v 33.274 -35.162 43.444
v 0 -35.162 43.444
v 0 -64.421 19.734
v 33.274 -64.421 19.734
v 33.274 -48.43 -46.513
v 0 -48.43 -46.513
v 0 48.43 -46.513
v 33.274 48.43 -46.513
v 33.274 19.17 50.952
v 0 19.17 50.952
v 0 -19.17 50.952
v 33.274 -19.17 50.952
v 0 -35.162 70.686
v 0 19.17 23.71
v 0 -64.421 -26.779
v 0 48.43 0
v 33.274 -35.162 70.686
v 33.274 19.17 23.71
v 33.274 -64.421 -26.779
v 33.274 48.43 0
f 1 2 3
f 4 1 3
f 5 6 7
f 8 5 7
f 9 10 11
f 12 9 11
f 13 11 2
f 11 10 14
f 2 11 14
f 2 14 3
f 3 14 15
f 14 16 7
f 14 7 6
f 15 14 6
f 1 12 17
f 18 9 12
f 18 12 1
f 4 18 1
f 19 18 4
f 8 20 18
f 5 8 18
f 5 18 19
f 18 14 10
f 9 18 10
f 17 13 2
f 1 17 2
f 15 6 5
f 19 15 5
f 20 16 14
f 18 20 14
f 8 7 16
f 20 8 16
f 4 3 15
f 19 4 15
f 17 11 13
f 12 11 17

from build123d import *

# Parameters (mm, degrees)
F1_DEPTH = 33.274
F2_DEPTH = 25.4


with BuildPart() as f1:
    # F0 (on Right) → F1 (new body)
    with BuildSketch(Plane.YZ):
        Polygon((0, 50.9521476924), (-19.1701129079, 50.9521476924), (-19.1701129079, 23.7104035914), (-48.4297610819, 0), (-48.4297610819, -46.5127490461), (0, -46.5127490461), (48.4297610819, -46.5127490461), (48.4297610819, 0), (19.1701129079, 23.7104035914), (19.1701129079, 50.9521476924), align=None)
    extrude(amount=F1_DEPTH)

    # F2 (add): faces of the model
    f2_faces = [f1.faces().sort_by_distance(p)[0] for p in [
        (16.637, -33.7999369949, 11.8552017957),
        (16.637, -48.4297610819, -23.256374523),
        (16.637, -19.1701129079, 37.3312756419),
    ]]
    extrude(f2_faces, amount=F2_DEPTH, dir=(0, -0.6295834828, 0.7769328402))


solid = f1.part
